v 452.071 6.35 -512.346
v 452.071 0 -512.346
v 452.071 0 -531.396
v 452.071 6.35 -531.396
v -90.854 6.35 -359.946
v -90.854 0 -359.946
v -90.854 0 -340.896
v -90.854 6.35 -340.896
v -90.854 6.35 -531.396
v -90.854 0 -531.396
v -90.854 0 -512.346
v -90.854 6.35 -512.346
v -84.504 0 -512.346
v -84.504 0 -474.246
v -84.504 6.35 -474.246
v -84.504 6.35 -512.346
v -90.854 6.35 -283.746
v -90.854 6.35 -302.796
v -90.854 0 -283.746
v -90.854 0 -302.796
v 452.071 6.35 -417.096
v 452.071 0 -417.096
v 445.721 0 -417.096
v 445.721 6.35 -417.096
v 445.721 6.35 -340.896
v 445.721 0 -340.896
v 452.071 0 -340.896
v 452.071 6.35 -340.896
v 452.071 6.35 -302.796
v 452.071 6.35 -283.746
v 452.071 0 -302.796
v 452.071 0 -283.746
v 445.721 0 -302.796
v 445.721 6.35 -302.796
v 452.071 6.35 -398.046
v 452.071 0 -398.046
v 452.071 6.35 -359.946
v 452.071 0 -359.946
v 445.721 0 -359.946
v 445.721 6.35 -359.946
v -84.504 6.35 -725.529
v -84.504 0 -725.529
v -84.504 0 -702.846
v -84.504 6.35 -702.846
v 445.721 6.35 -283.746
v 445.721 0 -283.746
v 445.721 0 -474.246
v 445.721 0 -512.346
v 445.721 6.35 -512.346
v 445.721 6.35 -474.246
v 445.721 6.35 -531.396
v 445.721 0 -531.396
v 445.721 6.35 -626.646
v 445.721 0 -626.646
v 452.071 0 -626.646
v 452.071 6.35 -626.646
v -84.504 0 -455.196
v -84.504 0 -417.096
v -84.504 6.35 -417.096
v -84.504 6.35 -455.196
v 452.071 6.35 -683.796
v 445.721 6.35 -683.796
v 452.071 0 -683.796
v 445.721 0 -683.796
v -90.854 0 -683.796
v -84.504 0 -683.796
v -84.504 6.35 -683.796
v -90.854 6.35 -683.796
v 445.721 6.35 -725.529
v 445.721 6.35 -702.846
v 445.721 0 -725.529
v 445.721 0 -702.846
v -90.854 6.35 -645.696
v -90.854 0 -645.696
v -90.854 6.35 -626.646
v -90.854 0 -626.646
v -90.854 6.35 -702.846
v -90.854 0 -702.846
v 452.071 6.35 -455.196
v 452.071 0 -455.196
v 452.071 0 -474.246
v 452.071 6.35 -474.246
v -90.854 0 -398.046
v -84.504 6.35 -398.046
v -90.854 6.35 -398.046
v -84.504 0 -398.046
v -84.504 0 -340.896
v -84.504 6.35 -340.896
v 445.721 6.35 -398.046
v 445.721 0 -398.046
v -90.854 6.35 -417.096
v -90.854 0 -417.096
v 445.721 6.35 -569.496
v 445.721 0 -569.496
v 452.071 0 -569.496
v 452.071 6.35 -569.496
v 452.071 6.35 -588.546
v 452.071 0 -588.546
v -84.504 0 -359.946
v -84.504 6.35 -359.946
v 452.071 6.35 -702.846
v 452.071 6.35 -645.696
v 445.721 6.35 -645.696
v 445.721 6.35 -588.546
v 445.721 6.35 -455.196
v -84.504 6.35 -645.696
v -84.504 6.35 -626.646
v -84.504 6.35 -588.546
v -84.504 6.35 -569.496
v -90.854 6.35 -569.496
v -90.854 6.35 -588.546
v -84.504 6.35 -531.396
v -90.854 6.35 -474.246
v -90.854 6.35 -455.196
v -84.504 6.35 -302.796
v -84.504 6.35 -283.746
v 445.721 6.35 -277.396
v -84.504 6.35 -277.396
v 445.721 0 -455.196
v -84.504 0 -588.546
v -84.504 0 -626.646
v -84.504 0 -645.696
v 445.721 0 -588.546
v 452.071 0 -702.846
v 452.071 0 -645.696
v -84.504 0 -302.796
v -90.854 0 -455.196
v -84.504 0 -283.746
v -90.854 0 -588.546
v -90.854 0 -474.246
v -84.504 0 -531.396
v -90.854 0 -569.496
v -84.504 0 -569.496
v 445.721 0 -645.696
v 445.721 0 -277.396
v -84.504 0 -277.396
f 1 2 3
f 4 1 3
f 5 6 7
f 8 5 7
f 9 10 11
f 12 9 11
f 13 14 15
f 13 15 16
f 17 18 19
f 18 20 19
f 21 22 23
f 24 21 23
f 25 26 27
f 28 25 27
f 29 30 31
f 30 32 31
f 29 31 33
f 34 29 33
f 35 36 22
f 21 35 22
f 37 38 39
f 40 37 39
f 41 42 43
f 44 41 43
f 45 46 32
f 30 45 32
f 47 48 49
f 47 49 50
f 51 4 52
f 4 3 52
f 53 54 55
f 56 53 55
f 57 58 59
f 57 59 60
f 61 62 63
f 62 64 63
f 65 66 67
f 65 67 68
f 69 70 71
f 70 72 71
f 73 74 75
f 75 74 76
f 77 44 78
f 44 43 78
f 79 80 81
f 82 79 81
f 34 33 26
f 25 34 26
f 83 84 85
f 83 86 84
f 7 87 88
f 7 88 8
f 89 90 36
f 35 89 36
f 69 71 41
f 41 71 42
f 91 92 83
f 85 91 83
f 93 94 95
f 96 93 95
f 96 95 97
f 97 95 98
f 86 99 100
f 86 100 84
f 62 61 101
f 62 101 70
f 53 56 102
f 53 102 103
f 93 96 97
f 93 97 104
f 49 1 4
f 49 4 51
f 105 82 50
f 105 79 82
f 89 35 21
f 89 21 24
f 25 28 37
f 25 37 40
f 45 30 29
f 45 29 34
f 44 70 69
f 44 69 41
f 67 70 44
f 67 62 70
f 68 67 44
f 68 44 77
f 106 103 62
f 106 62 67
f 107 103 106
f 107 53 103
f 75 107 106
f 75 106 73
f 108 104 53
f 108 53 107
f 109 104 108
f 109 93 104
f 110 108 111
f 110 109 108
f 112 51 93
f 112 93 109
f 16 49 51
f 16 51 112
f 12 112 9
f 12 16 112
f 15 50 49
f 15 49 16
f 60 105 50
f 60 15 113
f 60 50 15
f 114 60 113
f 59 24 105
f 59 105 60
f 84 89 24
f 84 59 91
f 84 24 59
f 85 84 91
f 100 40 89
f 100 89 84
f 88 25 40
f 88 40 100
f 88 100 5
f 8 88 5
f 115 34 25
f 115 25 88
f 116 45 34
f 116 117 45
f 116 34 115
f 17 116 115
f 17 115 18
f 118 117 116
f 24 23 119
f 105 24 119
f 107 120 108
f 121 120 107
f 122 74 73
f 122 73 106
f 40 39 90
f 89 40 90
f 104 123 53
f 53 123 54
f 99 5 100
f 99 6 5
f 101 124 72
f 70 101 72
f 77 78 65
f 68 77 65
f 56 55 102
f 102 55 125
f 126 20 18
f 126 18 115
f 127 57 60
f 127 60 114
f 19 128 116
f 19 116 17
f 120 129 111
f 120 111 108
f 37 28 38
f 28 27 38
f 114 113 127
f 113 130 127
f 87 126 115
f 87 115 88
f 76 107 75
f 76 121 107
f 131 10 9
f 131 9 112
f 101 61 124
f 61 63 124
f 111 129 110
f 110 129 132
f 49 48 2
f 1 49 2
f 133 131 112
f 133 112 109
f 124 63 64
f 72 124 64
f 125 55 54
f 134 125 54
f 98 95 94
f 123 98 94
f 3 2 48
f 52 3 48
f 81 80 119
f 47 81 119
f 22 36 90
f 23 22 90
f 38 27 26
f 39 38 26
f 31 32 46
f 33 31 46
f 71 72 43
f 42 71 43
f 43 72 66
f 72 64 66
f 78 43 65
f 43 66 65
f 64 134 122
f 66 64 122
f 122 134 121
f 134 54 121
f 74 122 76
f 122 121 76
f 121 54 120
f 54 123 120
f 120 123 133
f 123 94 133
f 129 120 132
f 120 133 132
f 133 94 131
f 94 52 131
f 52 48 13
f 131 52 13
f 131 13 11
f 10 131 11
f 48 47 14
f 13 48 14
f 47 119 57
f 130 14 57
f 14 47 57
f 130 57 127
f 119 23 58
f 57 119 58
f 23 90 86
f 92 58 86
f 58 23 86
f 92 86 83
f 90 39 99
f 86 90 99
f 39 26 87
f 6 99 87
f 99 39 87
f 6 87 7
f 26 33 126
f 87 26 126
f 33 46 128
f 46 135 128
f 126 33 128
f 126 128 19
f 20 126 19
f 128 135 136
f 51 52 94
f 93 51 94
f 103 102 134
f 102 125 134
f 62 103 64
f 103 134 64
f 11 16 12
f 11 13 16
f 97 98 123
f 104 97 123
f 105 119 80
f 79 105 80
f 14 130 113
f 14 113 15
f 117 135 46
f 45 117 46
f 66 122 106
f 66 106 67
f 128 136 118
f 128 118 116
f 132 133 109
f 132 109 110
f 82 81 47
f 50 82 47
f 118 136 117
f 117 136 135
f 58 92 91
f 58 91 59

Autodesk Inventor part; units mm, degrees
ref_plane "YZ Plane" through (0, 0, 0) normal (1, 0, 0) x (0, 1, 0)
ref_plane "XZ Plane" through (0, 0, 0) normal (0, 1, 0) x (-1, 0, 0)
ref_plane "XY Plane" through (0, 0, 0) normal (0, 0, 1) x (1, 0, 0)
sketch "Sketch1" plane through (0, 0, 0) normal (0, 1, 0) x (-1, 0, 0)
  line L0 (84.5044, -277.3965) -> (-445.7206, -277.3965)
  line L1 (-445.7206, -725.5287) -> (84.5044, -725.5287)
  line L2 (-445.7206, -277.3965) -> (-445.7206, -283.7465)
  line L3 (-445.7206, -283.7465) -> (-452.0706, -283.7465)
  line L4 (-452.0706, -302.7965) -> (-445.7206, -302.7965)
  line L5 (-445.7206, -302.7965) -> (-445.7206, -340.8965)
  line L6 (-445.7206, -340.8965) -> (-452.0706, -340.8965)
  line L7 (-452.0706, -359.9465) -> (-445.7206, -359.9465)
  line L8 (-445.7206, -359.9465) -> (-445.7206, -398.0465)
  line L9 (-445.7206, -398.0465) -> (-452.0706, -398.0465)
  line L10 (-452.0706, -417.0965) -> (-445.7206, -417.0965)
  line L11 (-445.7206, -417.0965) -> (-445.7206, -455.1965)
  line L12 (-445.7206, -455.1965) -> (-452.0706, -455.1965)
  line L13 (-452.0706, -474.2465) -> (-445.7206, -474.2465)
  line L14 (-445.7206, -512.3465) -> (-452.0706, -512.3465)
  line L15 (-452.0706, -531.3965) -> (-445.7206, -531.3965)
  line L16 (-445.7206, -531.3965) -> (-445.7206, -569.4965)
  line L17 (-445.7206, -569.4965) -> (-452.0706, -569.4965)
  line L18 (-452.0706, -588.5465) -> (-445.7206, -588.5465)
  line L19 (-445.7206, -588.5465) -> (-445.7206, -626.6465)
  line L20 (-445.7206, -626.6465) -> (-452.0706, -626.6465)
  line L21 (-452.0706, -645.6965) -> (-445.7206, -645.6965)
  line L22 (-445.7206, -645.6965) -> (-445.7206, -683.7965)
  line L23 (-445.7206, -683.7965) -> (-452.0706, -683.7965)
  line L24 (-452.0706, -702.8465) -> (-445.7206, -702.8465)
  line L25 (-445.7206, -702.8465) -> (-445.7206, -725.5287)
  line L26 (-452.0706, -283.7465) -> (-452.0706, -302.7965)
  line L27 (-452.0706, -340.8965) -> (-452.0706, -359.9465)
  line L28 (-452.0706, -398.0465) -> (-452.0706, -417.0965)
  line L29 (-452.0706, -455.1965) -> (-452.0706, -474.2465)
  line L30 (-452.0706, -512.3465) -> (-452.0706, -531.3965)
  line L31 (-452.0706, -569.4965) -> (-452.0706, -588.5465)
  line L32 (-452.0706, -626.6465) -> (-452.0706, -645.6965)
  line L33 (-452.0706, -683.7965) -> (-452.0706, -702.8465)
  line L34 (-445.7206, -512.3465) -> (-445.7206, -474.2465)
  line L35 (84.5044, -277.3965) -> (84.5044, -283.7465)
  line L36 (84.5044, -283.7465) -> (90.8544, -283.7465)
  line L37 (90.8544, -302.7965) -> (84.5044, -302.7965)
  line L38 (84.5044, -302.7965) -> (84.5044, -340.8965)
  line L39 (84.5044, -340.8965) -> (90.8544, -340.8965)
  line L40 (90.8544, -359.9465) -> (84.5044, -359.9465)
  line L41 (84.5044, -359.9465) -> (84.5044, -398.0465)
  line L42 (84.5044, -398.0465) -> (90.8544, -398.0465)
  line L43 (90.8544, -417.0965) -> (84.5044, -417.0965)
  line L44 (84.5044, -417.0965) -> (84.5044, -455.1965)
  line L45 (84.5044, -455.1965) -> (90.8544, -455.1965)
  line L46 (90.8544, -474.2465) -> (84.5044, -474.2465)
  line L47 (84.5044, -474.2465) -> (84.5044, -512.3465)
  line L48 (84.5044, -512.3465) -> (90.8544, -512.3465)
  line L49 (90.8544, -531.3965) -> (84.5044, -531.3965)
  line L50 (84.5044, -531.3965) -> (84.5044, -569.4965)
  line L51 (84.5044, -569.4965) -> (90.8544, -569.4965)
  line L52 (90.8544, -588.5465) -> (84.5044, -588.5465)
  line L53 (84.5044, -588.5465) -> (84.5044, -626.6465)
  line L54 (84.5044, -626.6465) -> (90.8544, -626.6465)
  line L55 (90.8544, -645.6965) -> (84.5044, -645.6965)
  line L56 (84.5044, -645.6965) -> (84.5044, -683.7965)
  line L57 (84.5044, -683.7965) -> (90.8544, -683.7965)
  line L58 (84.5044, -725.5287) -> (84.5044, -702.8465)
  line L59 (84.5044, -702.8465) -> (90.8544, -702.8465)
  line L60 (90.8544, -302.7965) -> (90.8544, -283.7465)
  line L61 (90.8544, -359.9465) -> (90.8544, -340.8965)
  line L62 (90.8544, -417.0965) -> (90.8544, -398.0465)
  line L63 (90.8544, -474.2465) -> (90.8544, -455.1965)
  line L64 (90.8544, -531.3965) -> (90.8544, -512.3465)
  line L65 (90.8544, -588.5465) -> (90.8544, -569.4965)
  line L66 (90.8544, -702.8465) -> (90.8544, -683.7965)
  line L67 (90.8544, -645.6965) -> (90.8544, -626.6465)
  line L68 (84.5044, -493.2965) -> (-445.7206, -493.2965)
  point P0 (0, 0)
  dimension "d53" = 6.35
  dimension "d54" = 38.1
  dimension "d55" = 19.05
  dimension "d56" = 19.05
  dimension "d57" = 19.05
  dimension "d58" = 38.1
  dimension "d59" = 38.1
  dimension "d60" = 19.05
  dimension "d61" = 38.1
  dimension "d62" = 19.05
  dimension "d63" = 38.1
  dimension "d64" = 19.05
  dimension "d65" = 38.1
  dimension "d66" = 19.05
  dimension "d67" = 38.1
  dimension "d68" = 19.05
  dimension "d69" = 6.35
  dimension "d70" = 6.35
  dimension "d71" = 6.35
  dimension "d72" = 6.35
  dimension "d74" = 6.35
  dimension "d75" = 6.35
  dimension "d76" = 6.35
  dimension "d94" = 22.6822
  dimension "d134" = 6.35
  dimension "d135" = 19.05
  dimension "d136" = 38.1
  dimension "d137" = 19.05
  dimension "d138" = 38.1
  dimension "d139" = 19.05
  dimension "d140" = 38.1
  dimension "d141" = 19.05
  dimension "d142" = 38.1
  dimension "d143" = 19.05
  dimension "d144" = 38.1
  dimension "d145" = 19.05
  dimension "d146" = 38.1
  dimension "d147" = 19.05
  dimension "d148" = 38.1
  dimension "d149" = 19.05
  dimension "d150" = 6.35
  dimension "d151" = 448.1322
  dimension "d152" = 542.925
extrude "Extrusion3" add sketch "Sketch1" along normal blind 6.35
properties part number "Back 2 V3"
